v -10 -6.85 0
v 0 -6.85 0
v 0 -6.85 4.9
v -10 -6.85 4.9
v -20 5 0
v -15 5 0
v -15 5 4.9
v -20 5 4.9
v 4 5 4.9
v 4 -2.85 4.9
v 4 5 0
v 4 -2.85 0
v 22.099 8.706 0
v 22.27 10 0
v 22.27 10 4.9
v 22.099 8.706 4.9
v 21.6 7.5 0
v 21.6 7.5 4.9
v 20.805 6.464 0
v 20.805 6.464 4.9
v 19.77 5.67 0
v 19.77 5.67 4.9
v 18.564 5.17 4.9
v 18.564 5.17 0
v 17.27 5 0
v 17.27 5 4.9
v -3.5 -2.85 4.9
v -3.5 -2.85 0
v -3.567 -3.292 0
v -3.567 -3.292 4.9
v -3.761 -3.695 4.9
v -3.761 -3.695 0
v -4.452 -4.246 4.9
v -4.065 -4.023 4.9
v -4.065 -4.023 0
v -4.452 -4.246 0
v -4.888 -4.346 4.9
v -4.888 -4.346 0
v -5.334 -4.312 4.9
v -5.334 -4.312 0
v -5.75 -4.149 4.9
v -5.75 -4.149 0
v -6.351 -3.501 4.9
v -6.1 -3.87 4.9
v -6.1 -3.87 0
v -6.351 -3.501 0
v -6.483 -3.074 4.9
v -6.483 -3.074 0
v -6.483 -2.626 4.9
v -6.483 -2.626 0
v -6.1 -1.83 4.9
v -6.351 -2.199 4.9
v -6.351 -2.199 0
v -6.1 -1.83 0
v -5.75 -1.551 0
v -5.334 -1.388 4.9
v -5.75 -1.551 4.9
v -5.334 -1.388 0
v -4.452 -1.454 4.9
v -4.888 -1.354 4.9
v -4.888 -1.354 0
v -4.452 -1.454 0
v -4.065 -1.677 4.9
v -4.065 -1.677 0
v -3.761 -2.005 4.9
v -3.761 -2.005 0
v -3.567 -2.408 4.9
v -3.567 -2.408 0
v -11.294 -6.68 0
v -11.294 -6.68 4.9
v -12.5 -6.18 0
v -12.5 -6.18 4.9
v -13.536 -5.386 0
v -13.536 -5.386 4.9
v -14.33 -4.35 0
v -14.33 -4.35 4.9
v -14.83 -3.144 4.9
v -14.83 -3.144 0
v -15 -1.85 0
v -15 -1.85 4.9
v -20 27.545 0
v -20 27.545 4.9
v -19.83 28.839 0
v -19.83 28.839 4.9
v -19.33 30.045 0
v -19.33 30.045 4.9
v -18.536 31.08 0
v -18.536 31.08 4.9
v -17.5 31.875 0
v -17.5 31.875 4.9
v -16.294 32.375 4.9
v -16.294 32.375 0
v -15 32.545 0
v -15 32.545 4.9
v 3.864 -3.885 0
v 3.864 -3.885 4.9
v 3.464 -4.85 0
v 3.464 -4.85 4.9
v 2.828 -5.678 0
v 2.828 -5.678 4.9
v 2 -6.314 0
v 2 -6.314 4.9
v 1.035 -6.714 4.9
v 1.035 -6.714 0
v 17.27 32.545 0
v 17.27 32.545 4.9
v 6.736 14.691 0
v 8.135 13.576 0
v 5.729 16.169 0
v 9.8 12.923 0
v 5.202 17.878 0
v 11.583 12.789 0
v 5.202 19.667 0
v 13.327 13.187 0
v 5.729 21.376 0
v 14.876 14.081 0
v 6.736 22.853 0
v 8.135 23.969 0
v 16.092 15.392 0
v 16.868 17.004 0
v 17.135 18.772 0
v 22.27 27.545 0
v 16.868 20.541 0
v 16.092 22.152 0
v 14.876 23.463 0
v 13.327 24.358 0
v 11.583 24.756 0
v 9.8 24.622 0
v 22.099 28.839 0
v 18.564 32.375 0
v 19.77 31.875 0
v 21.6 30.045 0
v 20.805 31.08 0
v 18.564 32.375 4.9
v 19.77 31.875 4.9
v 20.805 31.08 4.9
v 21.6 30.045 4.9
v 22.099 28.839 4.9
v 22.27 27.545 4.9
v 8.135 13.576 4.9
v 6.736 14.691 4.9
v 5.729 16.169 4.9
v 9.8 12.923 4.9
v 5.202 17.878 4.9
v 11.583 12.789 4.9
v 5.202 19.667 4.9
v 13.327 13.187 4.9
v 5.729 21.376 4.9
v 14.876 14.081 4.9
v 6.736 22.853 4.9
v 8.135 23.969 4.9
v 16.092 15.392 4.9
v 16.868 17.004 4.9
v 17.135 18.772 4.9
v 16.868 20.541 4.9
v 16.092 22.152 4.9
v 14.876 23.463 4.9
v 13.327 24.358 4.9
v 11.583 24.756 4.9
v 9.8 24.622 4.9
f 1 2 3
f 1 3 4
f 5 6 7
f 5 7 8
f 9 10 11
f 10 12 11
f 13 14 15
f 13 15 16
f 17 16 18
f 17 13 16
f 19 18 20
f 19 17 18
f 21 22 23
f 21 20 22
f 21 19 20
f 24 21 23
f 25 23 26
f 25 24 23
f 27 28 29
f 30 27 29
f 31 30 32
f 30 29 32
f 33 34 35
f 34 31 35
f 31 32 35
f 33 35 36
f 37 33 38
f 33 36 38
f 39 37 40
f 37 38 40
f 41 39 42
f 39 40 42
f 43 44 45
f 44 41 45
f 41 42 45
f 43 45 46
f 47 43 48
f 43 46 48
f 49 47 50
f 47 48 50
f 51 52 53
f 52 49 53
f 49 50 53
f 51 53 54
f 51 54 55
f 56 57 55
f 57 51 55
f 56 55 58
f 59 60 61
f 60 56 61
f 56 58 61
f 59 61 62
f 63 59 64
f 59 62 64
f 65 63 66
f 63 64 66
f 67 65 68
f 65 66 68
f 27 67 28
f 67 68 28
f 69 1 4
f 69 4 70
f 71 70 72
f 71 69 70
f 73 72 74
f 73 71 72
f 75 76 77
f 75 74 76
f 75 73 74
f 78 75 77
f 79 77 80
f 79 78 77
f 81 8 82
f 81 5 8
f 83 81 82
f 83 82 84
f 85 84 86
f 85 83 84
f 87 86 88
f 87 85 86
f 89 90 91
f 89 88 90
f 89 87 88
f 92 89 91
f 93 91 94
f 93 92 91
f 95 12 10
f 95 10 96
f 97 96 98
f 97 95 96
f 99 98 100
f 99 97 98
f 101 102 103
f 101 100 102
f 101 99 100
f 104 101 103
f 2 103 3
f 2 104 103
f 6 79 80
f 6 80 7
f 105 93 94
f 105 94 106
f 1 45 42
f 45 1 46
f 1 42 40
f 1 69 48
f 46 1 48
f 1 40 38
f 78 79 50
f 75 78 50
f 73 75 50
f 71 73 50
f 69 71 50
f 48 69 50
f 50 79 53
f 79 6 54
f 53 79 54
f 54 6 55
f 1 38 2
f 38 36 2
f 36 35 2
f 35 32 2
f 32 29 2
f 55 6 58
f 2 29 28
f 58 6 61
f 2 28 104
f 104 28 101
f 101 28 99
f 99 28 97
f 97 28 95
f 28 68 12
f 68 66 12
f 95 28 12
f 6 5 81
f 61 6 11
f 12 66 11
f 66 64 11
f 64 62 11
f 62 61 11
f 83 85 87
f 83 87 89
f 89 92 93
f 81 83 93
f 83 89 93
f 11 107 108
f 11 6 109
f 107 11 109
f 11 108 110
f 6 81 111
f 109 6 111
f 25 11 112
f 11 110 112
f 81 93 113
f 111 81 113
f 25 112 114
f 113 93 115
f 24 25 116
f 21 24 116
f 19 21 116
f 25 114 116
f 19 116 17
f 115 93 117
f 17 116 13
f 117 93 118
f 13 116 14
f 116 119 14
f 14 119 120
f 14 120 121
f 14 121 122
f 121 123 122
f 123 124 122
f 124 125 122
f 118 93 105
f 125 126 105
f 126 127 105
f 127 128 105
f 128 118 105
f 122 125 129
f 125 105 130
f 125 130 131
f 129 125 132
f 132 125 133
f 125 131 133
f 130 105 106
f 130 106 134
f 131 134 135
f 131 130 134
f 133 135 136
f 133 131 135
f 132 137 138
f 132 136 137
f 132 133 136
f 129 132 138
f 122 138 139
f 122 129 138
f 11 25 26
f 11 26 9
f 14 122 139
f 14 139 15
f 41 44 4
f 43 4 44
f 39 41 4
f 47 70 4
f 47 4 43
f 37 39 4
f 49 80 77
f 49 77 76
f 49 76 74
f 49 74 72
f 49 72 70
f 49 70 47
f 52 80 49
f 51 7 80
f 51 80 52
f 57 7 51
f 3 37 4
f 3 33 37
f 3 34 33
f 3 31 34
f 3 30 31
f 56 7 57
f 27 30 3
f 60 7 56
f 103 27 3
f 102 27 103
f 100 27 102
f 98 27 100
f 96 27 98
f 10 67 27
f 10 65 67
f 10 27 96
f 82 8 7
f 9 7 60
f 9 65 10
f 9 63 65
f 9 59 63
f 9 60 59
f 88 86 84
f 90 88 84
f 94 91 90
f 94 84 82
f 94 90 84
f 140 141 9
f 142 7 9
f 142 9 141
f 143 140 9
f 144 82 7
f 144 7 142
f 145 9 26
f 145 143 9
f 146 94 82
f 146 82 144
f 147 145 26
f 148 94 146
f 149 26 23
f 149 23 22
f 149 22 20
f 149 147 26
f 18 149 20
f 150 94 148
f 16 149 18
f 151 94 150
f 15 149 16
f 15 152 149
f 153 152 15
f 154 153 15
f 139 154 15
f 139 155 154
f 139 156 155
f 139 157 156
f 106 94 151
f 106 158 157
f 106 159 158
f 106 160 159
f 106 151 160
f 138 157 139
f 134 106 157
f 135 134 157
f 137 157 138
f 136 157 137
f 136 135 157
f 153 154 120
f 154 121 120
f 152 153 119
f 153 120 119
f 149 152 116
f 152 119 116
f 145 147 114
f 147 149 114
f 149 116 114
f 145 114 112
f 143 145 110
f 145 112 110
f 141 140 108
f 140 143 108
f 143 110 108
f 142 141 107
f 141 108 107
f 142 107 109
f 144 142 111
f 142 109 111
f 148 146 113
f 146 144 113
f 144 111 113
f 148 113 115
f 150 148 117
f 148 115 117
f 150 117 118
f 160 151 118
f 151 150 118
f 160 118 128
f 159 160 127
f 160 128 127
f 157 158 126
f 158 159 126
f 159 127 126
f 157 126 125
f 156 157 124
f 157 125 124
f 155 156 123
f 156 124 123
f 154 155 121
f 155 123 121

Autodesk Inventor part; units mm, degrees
ref_plane "YZ Plane" through (0, 0, 0) normal (1, 0, 0) x (0, 1, 0)
ref_plane "XZ Plane" through (0, 0, 0) normal (0, 1, 0) x (-1, 0, 0)
ref_plane "XY Plane" through (0, 0, 0) normal (0, 0, 1) x (1, 0, 0)
sketch "Эскиз1" plane through (0, 0, 0) normal (0, 0, 1) x (1, 0, 0)
  line L0 (-20, 5) -> (-20, 27.5449)
  arc A0 (22.2696, 27.5449) -> (17.2696, 32.5449) centre (17.2696, 27.5449) ccw
  line L1 (22.2696, 27.5449) -> (22.2696, 10)
  arc A1 (17.2696, 5) -> (22.2696, 10) centre (17.2696, 10) ccw
  circle A2 centre (-5, -2.85) radius 1.5
  line L2 (-15, 5) -> (-20, 5)
  line L3 (-15, 32.5449) -> (17.2696, 32.5449)
  arc A3 (-15, 32.5449) -> (-20, 27.5449) centre (-15, 27.5449) ccw
  line L4 (17.2696, 5) -> (4, 5)
  arc A4 (0, -6.85) -> (4, -2.85) centre (0, -2.85) ccw
  line L5 (4, -2.85) -> (4, 5)
  line L6 (0, -6.85) -> (-10, -6.85)
  line L7 (-15, -1.85) -> (-15, 5)
  arc A5 (-15, -1.85) -> (-10, -6.85) centre (-10, -1.85) ccw
  circle A6 centre (11.1348, 18.7724) radius 6
  point P0 (22.2696, 32.5449)
  point P1 (0, 32.5449)
  point P2 (22.2696, 5)
  dimension "d14" = 12
  dimension "d15" = 3
extrude "Выдавливание1" add sketch "Эскиз1" along normal blind 4.9
properties part number "Верт. держатели"
